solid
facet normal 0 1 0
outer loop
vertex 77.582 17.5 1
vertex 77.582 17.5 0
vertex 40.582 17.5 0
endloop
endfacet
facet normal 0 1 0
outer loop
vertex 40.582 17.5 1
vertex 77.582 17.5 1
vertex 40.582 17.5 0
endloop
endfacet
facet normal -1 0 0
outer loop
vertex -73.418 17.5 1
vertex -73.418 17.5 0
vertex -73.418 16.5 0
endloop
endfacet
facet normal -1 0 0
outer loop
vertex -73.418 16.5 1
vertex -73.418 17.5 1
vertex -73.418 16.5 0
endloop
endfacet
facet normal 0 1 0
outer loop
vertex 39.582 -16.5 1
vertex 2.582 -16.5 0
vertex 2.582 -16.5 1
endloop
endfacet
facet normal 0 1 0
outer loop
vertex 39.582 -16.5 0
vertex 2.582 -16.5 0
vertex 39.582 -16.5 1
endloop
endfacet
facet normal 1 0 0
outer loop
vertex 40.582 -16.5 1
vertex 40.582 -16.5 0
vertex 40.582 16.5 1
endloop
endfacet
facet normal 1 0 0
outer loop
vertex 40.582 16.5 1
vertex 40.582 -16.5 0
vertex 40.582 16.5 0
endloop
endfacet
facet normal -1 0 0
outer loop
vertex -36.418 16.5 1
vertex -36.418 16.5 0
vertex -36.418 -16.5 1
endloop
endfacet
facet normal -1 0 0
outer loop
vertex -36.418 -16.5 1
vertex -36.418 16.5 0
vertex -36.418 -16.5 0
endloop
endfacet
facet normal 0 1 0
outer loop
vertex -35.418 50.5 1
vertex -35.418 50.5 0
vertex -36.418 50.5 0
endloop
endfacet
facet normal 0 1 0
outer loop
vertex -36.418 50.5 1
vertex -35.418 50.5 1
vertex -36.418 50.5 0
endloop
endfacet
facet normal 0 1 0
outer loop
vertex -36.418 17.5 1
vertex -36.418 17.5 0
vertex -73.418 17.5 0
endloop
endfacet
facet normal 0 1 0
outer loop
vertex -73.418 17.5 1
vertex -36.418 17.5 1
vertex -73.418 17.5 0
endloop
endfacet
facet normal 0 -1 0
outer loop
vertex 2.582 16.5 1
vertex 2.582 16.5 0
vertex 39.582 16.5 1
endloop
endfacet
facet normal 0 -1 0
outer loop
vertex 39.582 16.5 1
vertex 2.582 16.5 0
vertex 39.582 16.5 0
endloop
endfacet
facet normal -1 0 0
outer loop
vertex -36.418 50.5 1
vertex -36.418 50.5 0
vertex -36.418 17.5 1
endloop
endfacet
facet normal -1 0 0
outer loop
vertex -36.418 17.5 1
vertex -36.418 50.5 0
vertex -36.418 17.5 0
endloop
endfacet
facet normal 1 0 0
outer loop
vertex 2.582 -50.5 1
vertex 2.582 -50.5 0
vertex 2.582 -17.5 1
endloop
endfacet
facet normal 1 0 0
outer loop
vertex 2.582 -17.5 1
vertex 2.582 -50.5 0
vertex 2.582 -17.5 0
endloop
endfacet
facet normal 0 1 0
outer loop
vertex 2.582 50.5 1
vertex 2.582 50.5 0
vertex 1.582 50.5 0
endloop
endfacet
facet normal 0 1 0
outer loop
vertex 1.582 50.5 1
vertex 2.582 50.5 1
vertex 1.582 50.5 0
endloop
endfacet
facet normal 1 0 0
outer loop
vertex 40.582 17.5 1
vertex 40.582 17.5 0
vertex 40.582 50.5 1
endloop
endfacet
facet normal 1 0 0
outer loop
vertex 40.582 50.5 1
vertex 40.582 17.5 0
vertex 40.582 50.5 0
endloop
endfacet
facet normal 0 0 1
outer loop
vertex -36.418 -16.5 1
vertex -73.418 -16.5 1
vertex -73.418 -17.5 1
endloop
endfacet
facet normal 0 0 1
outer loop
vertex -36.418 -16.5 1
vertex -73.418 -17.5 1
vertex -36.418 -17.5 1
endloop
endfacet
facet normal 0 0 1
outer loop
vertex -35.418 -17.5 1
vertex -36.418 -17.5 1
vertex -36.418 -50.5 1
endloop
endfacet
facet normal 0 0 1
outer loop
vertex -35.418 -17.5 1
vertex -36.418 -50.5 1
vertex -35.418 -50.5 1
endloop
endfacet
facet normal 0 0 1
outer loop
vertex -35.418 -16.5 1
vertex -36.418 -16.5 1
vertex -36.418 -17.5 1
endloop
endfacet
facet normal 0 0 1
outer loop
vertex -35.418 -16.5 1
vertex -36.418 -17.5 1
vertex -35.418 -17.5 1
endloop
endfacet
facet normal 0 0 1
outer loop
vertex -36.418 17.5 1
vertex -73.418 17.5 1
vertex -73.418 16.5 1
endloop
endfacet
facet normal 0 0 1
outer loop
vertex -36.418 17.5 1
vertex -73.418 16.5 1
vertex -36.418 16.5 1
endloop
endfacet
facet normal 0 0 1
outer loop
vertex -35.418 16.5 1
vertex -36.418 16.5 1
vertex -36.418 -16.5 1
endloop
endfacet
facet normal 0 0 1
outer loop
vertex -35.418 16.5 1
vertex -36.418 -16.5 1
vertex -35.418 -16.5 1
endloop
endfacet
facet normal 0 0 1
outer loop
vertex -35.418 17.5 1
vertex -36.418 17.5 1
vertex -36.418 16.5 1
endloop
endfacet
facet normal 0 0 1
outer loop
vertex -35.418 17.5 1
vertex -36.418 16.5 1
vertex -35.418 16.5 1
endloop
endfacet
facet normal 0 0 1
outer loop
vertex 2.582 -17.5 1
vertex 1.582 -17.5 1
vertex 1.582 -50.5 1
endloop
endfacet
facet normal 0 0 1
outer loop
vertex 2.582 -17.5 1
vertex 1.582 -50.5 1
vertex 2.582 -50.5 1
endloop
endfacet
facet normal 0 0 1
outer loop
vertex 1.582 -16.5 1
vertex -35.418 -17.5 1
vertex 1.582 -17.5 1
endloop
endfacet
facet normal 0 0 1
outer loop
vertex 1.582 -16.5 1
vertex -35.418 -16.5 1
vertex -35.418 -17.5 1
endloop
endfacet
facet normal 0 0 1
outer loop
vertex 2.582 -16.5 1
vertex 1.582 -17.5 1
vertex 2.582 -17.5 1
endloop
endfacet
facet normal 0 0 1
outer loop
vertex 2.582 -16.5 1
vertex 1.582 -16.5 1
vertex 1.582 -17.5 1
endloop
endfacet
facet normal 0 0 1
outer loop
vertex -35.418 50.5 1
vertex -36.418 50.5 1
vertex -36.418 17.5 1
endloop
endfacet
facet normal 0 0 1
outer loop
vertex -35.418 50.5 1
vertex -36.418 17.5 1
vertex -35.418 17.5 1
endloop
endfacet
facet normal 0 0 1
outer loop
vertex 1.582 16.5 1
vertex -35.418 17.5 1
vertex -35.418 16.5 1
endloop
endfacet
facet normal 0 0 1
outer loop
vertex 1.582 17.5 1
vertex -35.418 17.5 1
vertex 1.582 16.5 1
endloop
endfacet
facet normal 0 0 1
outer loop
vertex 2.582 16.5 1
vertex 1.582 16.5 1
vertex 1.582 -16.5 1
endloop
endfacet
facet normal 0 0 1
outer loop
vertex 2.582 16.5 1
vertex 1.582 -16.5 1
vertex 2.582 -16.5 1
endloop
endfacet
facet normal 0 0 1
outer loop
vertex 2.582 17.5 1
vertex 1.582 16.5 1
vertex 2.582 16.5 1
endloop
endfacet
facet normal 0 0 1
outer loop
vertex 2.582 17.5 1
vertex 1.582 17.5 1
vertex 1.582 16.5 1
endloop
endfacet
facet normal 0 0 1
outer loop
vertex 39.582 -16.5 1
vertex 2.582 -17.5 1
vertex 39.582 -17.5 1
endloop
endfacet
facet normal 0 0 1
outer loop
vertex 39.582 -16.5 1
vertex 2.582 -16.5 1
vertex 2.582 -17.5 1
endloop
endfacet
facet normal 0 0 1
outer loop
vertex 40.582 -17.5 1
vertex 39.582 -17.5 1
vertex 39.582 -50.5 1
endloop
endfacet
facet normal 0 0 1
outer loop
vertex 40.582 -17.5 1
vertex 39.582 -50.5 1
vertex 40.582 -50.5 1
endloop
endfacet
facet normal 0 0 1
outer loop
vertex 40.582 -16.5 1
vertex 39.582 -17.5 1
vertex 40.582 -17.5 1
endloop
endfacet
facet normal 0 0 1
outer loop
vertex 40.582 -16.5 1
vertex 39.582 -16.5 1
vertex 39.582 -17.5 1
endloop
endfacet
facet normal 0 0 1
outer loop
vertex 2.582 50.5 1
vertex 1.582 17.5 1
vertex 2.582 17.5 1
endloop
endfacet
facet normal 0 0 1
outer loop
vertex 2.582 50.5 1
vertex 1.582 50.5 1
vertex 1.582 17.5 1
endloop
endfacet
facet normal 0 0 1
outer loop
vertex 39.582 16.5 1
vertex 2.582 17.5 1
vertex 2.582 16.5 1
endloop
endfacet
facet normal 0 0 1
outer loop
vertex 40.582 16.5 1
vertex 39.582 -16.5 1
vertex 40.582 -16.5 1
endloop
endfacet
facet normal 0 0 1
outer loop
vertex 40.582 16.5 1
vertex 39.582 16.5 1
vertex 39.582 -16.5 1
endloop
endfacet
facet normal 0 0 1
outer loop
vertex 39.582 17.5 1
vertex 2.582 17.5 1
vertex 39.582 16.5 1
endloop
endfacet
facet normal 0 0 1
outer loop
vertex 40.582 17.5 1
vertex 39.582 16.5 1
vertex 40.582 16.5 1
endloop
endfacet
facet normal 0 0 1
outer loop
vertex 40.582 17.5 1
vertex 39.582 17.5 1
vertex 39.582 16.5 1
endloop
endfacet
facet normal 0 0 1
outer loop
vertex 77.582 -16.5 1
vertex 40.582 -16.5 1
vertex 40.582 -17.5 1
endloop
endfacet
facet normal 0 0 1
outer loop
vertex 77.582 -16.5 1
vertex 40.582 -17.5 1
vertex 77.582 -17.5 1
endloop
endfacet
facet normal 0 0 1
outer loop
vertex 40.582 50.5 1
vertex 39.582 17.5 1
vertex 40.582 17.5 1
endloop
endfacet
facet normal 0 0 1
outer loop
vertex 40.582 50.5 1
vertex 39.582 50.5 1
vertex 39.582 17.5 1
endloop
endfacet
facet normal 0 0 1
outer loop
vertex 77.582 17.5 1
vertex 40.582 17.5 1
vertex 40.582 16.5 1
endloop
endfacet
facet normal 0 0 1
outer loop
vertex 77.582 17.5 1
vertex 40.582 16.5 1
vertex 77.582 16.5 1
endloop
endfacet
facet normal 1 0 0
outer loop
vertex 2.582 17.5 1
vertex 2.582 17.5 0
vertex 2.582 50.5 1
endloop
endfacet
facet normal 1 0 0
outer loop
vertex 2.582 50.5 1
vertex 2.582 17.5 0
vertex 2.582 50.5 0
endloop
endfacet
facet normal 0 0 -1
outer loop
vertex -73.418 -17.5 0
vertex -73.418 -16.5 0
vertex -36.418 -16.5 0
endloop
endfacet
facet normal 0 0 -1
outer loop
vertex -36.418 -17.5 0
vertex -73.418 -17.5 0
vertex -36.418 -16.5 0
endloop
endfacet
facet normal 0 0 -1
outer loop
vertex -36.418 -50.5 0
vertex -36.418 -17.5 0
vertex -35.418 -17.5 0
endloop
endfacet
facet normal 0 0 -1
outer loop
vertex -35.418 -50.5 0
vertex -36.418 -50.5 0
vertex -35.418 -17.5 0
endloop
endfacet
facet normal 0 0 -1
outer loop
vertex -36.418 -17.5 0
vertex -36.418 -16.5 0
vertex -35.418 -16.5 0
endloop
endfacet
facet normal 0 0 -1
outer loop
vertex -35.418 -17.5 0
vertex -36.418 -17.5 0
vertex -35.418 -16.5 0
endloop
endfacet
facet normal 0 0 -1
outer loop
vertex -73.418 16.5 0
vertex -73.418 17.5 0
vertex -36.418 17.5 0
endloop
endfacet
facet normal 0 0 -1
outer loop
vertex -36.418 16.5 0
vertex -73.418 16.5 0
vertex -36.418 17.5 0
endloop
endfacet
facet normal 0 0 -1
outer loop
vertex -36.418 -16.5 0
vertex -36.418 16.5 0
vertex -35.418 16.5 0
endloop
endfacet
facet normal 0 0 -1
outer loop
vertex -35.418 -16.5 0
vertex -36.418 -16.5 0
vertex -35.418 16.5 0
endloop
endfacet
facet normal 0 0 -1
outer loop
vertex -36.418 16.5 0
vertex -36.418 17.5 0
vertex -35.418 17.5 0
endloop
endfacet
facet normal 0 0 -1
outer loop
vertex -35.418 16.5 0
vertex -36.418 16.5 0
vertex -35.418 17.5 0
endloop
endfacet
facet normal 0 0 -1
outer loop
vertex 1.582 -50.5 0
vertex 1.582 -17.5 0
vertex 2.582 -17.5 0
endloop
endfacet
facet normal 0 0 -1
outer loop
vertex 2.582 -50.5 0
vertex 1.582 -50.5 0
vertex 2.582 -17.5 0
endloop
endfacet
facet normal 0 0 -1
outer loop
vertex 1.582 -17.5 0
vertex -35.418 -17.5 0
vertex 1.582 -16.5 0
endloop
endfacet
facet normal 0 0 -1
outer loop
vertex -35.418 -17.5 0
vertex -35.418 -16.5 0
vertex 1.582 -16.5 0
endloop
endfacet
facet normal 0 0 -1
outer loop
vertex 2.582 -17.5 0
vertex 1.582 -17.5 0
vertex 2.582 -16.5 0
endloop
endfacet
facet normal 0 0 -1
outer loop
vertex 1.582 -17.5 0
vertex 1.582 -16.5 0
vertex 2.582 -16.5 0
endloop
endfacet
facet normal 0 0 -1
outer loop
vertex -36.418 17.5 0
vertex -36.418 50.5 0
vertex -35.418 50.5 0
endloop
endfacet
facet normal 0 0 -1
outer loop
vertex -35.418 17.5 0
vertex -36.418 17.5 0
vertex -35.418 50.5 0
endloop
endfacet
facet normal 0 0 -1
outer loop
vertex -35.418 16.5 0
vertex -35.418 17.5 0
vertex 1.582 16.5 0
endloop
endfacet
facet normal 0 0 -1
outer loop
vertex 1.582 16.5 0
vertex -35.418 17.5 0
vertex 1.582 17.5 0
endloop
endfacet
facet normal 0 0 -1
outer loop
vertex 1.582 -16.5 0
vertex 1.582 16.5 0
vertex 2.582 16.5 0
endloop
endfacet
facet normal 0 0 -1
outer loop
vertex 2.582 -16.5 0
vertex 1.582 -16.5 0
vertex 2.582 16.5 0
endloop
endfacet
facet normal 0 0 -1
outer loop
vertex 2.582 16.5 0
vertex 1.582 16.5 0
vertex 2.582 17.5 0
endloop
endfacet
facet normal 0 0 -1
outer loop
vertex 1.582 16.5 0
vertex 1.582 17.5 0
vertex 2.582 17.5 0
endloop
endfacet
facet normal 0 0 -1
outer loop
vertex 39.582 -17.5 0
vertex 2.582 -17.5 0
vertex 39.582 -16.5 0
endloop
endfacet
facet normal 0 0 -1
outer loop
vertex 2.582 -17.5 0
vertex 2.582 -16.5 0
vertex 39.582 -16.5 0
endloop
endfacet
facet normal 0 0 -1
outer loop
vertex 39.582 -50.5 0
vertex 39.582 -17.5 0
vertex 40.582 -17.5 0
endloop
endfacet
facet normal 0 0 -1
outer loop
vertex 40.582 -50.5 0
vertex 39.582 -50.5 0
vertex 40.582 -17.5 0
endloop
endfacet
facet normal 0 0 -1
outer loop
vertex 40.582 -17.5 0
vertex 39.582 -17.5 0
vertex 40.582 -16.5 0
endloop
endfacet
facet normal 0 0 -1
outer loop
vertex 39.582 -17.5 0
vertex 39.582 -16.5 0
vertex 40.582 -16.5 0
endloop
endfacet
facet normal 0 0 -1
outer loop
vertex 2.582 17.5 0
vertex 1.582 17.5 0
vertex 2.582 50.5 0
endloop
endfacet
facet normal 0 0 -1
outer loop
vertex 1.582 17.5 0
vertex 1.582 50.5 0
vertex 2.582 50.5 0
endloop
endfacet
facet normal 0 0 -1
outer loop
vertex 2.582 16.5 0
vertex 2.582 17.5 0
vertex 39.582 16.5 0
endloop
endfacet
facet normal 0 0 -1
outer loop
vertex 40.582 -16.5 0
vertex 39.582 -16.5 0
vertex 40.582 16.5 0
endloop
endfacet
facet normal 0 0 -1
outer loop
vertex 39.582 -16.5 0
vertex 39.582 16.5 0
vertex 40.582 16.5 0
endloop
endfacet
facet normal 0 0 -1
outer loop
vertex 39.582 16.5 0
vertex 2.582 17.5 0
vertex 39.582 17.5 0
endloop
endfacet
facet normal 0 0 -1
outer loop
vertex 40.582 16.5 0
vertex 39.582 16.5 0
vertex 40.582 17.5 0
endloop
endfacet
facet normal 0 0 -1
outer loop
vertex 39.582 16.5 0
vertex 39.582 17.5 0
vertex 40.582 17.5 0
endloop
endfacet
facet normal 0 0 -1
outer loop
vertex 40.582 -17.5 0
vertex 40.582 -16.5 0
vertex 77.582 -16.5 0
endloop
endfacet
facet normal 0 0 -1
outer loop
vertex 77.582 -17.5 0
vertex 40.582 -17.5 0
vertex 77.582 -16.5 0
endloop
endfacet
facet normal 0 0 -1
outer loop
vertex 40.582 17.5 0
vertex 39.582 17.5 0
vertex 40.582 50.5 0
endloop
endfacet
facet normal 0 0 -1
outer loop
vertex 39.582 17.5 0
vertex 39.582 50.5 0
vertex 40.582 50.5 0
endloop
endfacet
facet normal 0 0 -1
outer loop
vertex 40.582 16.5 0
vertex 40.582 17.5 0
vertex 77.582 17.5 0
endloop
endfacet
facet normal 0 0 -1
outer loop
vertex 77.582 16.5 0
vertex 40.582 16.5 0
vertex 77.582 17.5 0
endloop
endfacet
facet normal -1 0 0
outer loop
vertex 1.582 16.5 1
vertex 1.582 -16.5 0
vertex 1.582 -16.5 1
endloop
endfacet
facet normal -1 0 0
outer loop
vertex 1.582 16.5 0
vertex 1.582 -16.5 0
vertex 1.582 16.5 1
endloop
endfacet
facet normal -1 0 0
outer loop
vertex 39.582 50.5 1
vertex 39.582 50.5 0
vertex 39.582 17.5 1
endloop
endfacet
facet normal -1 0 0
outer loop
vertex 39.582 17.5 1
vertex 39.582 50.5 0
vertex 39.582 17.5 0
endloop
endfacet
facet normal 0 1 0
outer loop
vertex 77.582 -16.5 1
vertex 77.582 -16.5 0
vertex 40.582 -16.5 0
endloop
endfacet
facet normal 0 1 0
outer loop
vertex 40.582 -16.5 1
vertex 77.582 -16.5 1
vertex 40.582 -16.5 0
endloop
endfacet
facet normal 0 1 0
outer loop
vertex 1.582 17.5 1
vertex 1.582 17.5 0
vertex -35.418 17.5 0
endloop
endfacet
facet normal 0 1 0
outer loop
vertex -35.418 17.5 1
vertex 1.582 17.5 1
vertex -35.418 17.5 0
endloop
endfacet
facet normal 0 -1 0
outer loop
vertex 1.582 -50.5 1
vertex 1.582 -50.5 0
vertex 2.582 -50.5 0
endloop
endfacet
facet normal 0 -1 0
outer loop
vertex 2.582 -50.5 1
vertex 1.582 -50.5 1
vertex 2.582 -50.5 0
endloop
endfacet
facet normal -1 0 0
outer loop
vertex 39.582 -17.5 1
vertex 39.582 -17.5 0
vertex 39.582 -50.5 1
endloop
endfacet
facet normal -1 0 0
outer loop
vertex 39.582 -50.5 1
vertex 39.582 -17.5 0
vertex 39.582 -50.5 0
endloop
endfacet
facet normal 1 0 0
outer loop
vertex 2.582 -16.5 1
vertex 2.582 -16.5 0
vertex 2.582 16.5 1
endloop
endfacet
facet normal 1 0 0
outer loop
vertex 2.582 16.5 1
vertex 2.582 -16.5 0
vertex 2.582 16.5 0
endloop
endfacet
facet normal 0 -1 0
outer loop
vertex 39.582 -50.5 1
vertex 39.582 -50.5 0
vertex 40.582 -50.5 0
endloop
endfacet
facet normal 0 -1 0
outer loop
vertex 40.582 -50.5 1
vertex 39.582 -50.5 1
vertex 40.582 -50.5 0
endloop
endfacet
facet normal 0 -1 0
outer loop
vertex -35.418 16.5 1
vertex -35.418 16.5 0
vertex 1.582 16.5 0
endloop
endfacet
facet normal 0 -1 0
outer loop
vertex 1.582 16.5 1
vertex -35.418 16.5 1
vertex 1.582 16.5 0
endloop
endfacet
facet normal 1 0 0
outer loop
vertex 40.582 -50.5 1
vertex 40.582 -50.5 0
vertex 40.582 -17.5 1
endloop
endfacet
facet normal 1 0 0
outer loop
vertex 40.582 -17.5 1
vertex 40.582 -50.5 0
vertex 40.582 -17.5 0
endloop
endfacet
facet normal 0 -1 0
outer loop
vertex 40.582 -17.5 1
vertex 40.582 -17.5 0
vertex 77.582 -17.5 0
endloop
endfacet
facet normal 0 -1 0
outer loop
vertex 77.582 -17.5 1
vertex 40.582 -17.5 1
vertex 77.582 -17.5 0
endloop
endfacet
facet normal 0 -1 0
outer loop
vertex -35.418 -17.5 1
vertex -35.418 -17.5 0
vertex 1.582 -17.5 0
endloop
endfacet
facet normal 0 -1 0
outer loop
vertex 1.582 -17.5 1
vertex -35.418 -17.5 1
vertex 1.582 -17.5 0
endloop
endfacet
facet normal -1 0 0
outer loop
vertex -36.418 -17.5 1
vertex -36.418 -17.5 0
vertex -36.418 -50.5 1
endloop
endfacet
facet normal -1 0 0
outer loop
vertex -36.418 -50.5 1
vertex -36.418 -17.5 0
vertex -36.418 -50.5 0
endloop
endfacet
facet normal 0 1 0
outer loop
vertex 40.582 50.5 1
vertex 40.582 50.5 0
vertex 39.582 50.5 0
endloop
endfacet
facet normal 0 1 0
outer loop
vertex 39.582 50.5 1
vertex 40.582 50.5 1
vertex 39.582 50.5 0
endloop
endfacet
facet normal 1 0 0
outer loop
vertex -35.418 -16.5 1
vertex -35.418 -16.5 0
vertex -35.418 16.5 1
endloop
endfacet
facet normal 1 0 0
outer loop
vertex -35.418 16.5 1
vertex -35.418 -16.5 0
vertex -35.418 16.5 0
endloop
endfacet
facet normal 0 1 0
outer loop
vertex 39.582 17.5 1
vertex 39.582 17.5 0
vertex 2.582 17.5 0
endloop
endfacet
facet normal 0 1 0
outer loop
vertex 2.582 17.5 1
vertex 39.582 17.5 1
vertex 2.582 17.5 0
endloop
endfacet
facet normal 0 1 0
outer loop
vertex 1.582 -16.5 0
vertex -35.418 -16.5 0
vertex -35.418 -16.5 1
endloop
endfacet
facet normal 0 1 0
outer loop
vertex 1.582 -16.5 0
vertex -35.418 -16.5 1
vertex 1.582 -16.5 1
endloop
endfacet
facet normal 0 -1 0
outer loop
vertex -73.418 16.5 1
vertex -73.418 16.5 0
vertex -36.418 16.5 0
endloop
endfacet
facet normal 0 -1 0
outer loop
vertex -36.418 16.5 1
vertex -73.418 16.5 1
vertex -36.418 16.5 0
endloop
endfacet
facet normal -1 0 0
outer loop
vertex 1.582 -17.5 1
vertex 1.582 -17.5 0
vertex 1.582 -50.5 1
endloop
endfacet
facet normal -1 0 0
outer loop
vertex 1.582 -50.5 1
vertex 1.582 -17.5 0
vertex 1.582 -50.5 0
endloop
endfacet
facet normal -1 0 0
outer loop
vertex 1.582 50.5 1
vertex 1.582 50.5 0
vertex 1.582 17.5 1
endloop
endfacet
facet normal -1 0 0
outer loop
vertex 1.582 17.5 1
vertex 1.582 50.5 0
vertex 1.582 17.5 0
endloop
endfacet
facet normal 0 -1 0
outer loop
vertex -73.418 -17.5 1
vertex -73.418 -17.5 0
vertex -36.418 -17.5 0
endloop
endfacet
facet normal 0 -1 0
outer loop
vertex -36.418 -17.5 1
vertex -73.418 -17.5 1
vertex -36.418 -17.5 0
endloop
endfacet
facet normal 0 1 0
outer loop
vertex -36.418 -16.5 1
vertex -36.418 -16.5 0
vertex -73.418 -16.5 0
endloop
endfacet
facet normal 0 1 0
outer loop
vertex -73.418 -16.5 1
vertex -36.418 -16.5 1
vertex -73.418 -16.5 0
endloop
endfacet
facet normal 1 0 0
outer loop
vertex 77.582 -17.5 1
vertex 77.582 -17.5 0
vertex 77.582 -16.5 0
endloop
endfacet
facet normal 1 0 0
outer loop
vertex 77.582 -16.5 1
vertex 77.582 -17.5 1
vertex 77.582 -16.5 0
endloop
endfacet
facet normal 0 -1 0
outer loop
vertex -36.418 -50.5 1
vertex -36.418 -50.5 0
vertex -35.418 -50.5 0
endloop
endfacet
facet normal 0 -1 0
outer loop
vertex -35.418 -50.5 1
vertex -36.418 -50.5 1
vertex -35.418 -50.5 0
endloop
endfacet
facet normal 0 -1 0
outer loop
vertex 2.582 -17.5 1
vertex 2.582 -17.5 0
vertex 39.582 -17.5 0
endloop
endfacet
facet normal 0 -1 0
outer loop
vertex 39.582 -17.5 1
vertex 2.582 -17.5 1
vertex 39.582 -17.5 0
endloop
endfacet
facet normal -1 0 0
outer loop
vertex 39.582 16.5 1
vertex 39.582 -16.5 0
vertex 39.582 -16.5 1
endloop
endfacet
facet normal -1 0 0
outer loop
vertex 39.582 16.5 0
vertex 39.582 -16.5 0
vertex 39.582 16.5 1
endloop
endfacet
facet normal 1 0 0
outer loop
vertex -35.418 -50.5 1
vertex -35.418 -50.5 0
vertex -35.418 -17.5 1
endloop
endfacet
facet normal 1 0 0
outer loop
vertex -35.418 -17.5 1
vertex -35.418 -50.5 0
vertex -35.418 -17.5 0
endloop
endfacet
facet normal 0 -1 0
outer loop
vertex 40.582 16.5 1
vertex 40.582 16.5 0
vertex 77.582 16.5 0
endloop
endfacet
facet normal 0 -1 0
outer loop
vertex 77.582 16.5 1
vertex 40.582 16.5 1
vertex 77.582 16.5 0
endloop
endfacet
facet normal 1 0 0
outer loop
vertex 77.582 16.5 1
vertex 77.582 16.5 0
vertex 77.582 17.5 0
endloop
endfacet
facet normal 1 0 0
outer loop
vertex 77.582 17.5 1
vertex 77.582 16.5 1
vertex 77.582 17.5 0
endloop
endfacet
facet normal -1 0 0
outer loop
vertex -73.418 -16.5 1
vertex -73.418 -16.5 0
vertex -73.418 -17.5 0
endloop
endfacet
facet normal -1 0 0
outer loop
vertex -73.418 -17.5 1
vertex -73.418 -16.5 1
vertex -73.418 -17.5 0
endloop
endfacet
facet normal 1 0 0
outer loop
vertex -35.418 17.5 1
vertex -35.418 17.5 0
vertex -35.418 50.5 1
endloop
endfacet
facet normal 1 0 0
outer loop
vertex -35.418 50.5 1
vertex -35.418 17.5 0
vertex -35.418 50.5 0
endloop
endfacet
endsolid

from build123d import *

# Parameters (mm, degrees)
F0_W     = 37
F0_H     = 33
F1_DEPTH = 1


with BuildPart() as f1:
    # F0 (on Top) → F1 (new body)
    with BuildSketch(Plane.XY):
        Polygon((-35.418198, 50.5), (-36.418198, 50.5), (-36.418198, 17.5), (-73.418198, 17.5), (-73.418198, 16.5), (-36.418198, 16.5), (-36.418198, -16.5), (-73.418198, -16.5), (-73.418198, -17.5), (-36.418198, -17.5), (-36.418198, -50.5), (-35.418198, -50.5), (-35.418198, -17.5), (1.581802, -17.5), (1.581802, -50.5), (2.581802, -50.5), (2.581802, -17.5), (39.581802, -17.5), (39.581802, -50.5), (40.581802, -50.5), (40.581802, -17.5), (77.581802, -17.5), (77.581802, -16.5), (40.581802, -16.5), (40.581802, 16.5), (77.581802, 16.5), (77.581802, 17.5), (40.581802, 17.5), (40.581802, 50.5), (39.581802, 50.5), (39.581802, 17.5), (2.581802, 17.5), (2.581802, 50.5), (1.581802, 50.5), (1.581802, 17.5), (-35.418198, 17.5), align=None)
        with Locations((-16.918198, 0)):
            Rectangle(F0_W, F0_H, mode=Mode.SUBTRACT)
        with Locations((21.081802, 0)):
            Rectangle(F0_W, F0_H, mode=Mode.SUBTRACT)
    extrude(amount=F1_DEPTH)


solid = f1.part
